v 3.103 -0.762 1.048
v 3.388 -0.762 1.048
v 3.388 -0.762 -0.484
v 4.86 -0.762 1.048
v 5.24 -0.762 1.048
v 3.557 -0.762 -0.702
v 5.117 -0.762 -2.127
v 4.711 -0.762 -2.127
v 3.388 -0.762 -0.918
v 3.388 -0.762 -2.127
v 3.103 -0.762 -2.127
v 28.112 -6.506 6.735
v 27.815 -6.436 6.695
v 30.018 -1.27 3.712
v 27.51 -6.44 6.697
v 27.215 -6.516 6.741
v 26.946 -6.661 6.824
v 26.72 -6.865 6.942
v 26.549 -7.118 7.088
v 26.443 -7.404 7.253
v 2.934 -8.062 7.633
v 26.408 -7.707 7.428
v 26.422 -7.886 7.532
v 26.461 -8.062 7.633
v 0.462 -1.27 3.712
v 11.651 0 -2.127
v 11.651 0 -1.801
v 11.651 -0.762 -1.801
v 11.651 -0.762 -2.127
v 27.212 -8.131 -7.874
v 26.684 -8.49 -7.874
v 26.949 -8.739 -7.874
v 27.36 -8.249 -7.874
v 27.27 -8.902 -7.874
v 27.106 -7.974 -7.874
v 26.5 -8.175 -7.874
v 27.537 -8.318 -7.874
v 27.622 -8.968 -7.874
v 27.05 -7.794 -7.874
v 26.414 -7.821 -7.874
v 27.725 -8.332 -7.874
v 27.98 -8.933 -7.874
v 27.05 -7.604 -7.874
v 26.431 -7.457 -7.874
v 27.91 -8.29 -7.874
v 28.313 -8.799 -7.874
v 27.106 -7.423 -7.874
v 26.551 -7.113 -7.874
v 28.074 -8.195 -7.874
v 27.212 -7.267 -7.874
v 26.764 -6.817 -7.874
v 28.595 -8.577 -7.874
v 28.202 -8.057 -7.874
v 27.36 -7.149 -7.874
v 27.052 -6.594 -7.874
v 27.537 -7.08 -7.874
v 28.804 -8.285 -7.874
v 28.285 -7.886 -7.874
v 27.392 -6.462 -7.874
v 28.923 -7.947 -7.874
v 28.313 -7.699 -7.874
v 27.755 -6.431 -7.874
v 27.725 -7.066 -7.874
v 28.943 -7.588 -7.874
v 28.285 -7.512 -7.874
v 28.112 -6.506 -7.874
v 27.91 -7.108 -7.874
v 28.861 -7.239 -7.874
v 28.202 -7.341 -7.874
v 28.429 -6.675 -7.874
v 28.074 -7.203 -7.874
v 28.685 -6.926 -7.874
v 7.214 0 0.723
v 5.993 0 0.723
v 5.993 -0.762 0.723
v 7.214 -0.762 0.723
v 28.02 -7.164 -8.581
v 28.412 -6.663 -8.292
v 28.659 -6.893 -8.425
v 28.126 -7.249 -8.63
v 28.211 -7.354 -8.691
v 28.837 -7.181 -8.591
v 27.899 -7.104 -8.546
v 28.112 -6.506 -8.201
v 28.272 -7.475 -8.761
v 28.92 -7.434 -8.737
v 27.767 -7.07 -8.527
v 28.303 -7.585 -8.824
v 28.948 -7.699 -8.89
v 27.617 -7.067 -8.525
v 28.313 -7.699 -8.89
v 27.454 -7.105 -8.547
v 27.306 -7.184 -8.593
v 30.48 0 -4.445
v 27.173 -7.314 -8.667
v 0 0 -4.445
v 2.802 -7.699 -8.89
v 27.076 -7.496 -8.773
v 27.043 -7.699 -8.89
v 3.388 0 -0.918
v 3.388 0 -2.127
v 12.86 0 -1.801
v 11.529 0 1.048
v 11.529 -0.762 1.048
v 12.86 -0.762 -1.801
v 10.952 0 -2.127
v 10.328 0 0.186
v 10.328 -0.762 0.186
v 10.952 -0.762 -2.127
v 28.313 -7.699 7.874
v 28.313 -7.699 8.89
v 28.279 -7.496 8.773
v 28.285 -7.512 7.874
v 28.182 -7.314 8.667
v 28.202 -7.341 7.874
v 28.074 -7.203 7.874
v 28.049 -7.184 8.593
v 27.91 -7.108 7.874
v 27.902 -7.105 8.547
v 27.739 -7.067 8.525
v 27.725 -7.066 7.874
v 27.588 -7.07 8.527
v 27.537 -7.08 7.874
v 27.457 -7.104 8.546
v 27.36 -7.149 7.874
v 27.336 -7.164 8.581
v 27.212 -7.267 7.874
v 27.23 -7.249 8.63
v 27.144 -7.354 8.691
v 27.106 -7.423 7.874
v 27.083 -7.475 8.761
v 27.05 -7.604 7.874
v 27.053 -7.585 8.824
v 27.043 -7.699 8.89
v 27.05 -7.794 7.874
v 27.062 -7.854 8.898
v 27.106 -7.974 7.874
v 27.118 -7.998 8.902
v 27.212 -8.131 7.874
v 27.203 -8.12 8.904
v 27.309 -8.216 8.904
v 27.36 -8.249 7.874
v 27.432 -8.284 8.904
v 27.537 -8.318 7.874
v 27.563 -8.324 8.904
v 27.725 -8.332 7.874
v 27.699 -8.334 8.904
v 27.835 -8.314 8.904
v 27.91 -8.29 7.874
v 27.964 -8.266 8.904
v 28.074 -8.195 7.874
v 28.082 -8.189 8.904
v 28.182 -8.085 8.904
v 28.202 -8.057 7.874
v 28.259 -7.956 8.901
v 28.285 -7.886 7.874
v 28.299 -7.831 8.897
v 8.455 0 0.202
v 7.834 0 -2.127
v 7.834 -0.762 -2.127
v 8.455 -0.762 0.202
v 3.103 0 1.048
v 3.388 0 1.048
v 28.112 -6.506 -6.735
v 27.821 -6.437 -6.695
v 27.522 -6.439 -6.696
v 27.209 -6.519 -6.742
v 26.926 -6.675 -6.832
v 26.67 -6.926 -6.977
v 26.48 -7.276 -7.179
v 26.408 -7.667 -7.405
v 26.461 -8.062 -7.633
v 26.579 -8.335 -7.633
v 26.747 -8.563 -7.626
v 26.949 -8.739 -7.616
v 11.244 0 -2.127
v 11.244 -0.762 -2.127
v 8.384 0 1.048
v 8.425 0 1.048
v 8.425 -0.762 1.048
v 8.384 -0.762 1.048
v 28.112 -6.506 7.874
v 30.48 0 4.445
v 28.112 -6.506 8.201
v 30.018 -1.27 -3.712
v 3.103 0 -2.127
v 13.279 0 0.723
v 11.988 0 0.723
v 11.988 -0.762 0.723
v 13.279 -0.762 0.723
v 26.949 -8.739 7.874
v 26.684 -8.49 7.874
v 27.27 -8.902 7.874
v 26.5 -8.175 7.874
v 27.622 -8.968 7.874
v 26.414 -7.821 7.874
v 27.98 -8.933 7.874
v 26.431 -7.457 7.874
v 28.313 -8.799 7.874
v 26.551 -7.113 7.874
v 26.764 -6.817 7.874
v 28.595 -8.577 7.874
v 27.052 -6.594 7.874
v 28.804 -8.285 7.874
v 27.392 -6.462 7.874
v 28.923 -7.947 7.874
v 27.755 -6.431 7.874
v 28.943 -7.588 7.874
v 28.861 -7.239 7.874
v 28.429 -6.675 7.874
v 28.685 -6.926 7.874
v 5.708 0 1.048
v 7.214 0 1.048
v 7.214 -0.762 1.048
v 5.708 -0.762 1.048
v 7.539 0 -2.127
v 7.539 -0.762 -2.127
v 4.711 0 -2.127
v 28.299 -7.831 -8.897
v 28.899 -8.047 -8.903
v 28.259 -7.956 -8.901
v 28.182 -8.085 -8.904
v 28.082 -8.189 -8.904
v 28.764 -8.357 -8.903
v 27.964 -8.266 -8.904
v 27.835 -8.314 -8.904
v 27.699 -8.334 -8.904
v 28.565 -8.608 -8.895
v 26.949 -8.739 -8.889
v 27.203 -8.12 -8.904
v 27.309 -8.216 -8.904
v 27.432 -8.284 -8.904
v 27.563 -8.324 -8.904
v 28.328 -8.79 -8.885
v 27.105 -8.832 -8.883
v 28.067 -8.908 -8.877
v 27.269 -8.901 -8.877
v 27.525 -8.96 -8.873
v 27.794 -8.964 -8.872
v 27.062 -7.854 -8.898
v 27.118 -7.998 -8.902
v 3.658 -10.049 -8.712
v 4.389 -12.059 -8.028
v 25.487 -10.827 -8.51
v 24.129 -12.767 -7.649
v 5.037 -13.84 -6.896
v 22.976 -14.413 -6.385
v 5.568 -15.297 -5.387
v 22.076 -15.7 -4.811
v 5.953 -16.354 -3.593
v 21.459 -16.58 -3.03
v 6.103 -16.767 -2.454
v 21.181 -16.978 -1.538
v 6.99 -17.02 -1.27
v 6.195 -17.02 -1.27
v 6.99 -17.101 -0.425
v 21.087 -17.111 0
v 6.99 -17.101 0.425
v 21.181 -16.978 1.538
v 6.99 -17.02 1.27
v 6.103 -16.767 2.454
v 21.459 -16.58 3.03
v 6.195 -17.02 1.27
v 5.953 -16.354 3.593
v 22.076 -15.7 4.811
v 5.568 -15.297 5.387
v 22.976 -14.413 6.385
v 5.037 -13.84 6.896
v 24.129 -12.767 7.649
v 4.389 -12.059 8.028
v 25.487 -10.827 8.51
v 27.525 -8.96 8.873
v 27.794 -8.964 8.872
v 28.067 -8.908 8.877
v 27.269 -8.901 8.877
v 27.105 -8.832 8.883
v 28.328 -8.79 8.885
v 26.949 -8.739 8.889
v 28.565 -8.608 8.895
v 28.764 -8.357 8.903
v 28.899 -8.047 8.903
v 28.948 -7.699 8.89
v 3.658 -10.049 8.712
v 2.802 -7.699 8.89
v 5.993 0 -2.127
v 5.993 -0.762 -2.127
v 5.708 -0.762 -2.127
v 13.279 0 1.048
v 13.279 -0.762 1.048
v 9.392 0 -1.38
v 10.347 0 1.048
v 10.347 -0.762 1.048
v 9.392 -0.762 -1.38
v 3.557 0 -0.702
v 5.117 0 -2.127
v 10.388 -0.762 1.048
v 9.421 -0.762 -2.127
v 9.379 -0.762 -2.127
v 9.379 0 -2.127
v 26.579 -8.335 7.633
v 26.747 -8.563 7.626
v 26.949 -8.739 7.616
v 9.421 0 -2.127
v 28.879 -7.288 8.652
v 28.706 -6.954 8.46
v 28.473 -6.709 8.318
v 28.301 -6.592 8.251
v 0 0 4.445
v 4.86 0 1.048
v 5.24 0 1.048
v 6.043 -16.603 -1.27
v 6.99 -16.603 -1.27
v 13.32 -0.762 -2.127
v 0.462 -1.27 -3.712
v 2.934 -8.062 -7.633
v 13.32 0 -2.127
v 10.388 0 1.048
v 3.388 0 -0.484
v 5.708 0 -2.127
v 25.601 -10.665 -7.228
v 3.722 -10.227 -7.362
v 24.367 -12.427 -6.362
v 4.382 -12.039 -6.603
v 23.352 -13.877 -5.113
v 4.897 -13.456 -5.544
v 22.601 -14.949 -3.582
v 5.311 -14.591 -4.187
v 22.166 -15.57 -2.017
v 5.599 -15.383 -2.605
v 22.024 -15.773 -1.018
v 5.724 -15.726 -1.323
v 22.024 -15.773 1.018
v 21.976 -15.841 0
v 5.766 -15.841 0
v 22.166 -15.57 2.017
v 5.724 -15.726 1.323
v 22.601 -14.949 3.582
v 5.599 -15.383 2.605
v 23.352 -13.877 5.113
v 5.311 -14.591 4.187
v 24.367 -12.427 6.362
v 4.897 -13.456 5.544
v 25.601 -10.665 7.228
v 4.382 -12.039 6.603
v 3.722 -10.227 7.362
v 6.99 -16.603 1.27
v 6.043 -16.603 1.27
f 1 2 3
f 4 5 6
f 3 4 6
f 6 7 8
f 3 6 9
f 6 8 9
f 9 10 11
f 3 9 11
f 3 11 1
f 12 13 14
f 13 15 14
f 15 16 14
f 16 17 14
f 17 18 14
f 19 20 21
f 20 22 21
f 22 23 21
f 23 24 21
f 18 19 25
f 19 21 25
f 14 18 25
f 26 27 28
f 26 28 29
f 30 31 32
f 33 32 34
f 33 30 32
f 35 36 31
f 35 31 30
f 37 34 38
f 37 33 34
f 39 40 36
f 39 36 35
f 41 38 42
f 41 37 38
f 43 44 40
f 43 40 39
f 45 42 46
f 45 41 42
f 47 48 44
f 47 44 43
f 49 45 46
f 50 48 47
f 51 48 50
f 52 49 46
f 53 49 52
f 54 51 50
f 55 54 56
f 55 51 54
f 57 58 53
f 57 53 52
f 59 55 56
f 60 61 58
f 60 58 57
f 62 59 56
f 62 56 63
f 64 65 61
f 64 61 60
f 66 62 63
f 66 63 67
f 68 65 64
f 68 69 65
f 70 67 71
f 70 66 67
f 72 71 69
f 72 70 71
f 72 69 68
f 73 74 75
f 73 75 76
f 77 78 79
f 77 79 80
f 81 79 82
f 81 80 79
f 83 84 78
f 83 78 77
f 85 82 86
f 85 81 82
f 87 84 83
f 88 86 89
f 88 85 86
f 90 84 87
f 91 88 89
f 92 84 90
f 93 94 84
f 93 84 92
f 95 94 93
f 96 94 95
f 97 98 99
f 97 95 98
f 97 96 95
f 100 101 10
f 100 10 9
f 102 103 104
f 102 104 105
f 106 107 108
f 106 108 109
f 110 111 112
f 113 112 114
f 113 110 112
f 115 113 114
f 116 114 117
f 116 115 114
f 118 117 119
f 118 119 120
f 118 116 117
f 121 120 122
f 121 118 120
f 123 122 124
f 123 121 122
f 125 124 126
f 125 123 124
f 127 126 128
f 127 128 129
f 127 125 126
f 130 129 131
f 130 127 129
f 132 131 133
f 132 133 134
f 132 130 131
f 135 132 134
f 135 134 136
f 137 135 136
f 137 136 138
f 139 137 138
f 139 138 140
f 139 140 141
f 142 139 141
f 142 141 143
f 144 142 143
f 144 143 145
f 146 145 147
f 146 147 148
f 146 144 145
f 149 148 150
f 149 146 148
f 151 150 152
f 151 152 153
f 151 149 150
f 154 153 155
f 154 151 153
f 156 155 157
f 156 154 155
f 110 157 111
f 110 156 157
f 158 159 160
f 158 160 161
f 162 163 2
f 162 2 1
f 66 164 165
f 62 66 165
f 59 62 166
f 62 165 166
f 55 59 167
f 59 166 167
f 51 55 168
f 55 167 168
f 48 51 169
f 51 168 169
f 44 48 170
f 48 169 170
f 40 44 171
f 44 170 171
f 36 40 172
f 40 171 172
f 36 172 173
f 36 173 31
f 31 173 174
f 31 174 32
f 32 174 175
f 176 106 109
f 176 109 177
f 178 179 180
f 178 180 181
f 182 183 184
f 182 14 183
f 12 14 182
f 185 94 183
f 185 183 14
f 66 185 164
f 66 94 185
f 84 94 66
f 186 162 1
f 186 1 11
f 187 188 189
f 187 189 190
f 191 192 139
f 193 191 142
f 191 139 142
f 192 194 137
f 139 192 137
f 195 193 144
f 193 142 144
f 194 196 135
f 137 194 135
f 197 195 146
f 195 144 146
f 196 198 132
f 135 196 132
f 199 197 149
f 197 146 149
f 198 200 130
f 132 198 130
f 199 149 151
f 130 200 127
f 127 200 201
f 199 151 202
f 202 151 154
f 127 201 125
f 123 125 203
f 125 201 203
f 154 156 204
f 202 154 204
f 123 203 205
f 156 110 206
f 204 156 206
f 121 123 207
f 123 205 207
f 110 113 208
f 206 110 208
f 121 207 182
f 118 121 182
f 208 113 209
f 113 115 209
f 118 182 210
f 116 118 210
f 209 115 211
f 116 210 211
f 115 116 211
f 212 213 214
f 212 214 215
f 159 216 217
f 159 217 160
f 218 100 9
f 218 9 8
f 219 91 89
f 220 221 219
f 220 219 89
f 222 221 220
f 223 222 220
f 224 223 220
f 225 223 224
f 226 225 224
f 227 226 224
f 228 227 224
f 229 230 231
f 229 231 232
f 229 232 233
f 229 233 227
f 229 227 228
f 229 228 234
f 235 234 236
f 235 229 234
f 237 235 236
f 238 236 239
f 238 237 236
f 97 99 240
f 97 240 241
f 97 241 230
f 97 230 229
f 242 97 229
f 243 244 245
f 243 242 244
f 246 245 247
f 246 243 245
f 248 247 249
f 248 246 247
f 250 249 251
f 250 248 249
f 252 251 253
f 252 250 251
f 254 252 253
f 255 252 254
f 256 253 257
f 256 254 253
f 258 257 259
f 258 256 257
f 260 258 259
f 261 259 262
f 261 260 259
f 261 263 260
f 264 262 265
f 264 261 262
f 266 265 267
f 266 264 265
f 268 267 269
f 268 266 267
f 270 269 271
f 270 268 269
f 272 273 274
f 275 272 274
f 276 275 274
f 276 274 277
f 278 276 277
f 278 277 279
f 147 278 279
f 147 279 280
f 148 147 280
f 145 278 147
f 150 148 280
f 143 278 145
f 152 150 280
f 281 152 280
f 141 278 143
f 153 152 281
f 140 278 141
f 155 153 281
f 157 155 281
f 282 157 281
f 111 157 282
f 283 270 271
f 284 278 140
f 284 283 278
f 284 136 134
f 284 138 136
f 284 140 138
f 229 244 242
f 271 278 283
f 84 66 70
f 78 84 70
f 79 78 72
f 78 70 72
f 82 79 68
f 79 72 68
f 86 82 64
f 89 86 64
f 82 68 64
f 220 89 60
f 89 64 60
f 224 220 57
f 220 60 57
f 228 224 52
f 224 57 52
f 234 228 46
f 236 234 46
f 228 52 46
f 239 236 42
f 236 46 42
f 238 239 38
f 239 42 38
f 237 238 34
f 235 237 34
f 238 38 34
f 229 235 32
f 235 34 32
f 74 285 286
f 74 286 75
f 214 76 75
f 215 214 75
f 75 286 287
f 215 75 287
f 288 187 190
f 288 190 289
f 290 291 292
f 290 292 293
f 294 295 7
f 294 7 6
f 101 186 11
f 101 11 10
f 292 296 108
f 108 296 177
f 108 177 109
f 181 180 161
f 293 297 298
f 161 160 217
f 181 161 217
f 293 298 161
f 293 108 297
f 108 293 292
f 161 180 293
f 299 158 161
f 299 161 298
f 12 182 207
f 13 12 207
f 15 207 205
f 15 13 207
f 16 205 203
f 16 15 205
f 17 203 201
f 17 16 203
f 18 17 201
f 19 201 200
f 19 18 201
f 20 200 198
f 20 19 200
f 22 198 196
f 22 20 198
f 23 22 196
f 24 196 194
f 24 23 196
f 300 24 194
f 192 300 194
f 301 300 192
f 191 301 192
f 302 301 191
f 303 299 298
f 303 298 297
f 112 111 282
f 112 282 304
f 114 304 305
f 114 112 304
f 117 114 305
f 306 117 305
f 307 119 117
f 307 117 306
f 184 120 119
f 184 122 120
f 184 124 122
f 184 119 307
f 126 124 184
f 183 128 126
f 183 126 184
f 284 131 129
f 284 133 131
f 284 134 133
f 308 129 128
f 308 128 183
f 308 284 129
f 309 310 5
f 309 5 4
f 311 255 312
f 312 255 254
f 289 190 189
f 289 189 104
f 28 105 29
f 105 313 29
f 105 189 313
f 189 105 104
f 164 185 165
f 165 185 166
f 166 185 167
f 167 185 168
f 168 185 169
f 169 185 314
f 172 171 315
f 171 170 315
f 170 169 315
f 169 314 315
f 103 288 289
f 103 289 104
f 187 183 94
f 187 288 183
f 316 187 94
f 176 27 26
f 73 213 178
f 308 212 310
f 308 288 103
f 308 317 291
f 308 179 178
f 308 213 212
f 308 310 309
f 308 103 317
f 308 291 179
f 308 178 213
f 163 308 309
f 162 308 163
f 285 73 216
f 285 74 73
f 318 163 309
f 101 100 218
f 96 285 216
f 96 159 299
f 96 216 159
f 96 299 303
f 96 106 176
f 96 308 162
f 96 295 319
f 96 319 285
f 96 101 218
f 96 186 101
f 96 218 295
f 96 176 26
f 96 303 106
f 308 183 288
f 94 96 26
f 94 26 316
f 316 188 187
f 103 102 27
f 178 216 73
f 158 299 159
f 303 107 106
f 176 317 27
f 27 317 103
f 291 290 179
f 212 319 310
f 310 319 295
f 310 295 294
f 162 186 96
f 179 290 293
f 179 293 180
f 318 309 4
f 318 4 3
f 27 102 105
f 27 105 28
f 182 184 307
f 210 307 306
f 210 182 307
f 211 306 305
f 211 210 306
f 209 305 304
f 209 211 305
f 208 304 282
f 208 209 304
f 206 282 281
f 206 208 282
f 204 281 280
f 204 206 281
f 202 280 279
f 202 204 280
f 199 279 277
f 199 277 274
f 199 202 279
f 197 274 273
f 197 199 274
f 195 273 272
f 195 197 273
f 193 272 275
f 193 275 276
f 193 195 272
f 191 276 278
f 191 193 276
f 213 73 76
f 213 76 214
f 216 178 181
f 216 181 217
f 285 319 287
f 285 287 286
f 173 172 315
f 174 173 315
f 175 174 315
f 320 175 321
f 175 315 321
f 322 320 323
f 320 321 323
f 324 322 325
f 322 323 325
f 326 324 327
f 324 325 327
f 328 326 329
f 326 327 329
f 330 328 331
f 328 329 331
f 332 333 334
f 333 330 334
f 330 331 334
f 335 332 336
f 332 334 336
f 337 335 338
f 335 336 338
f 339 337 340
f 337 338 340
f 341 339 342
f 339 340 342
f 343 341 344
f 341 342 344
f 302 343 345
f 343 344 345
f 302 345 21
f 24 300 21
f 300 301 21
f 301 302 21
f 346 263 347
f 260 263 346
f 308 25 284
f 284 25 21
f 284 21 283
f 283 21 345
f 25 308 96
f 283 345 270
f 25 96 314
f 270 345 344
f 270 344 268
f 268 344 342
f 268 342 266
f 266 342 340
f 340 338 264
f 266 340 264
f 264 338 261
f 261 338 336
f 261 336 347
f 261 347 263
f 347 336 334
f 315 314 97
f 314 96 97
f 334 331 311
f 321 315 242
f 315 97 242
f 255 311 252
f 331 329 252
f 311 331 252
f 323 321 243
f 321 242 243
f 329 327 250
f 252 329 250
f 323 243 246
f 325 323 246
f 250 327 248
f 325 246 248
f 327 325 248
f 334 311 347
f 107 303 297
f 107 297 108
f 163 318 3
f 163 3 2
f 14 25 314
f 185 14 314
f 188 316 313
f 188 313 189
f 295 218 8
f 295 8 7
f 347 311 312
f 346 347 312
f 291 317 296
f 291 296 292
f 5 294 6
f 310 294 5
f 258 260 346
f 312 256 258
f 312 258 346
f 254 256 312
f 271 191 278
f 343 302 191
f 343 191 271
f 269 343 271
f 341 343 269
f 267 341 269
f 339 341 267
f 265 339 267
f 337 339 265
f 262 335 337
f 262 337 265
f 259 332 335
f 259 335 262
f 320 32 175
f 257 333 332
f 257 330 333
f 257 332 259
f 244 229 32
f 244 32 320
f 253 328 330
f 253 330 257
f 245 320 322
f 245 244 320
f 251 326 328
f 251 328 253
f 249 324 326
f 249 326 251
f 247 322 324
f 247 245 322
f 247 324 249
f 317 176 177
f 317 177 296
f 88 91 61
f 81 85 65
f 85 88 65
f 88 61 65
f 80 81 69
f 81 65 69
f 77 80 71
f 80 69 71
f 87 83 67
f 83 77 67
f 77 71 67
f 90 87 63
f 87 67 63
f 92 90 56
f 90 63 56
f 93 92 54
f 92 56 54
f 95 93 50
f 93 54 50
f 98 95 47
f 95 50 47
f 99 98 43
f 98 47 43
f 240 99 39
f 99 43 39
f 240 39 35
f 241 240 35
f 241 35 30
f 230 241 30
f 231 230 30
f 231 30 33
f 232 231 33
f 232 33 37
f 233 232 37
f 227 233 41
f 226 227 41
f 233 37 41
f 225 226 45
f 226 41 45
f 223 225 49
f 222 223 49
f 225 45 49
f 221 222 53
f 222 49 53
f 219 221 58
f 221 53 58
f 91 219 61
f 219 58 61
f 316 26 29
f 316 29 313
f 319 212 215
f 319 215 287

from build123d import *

# Parameters (mm, degrees)
BOSS_EXTRUDE1_DEPTH     = 30.48
SHELL1_T                = -1.27
SKETCH2_R               = 0.635
CUT_EXTRUDE1_DEPTH      = 9.904502457
CUT_EXTRUDE1_DEPTH_BACK = 9.904502457
SKETCH4_R               = 1.27
CUT_EXTRUDE3_DEPTH      = 7.874
CUT_EXTRUDE3_DEPTH_BACK = 7.874
SKETCH5_W               = 1.524
SKETCH5_H               = 2.54
CUT_EXTRUDE5_DEPTH      = 0.508
CUT_EXTRUDE2_DEPTH      = 0.762


with BuildPart() as part:
    # Sketch1 → Boss-Extrude1 (new body)
    with BuildSketch(Plane(origin=(0, 0, 0), x_dir=(0, 0, -1), z_dir=(1, 0, 0))):
        with BuildLine():
            Line((-4.445, 0), (4.445, 0))
            Line((4.445, 0), (8.89, -7.69896584))
            ThreePointArc((8.89, -7.69896584), (0, -17.111468296), (-8.89, -7.69896584))
            Line((-8.89, -7.69896584), (-4.445, 0))
        make_face()
    extrude(amount=BOSS_EXTRUDE1_DEPTH)

    # Shell1
    shell1_openings = [part.faces().sort_by_distance(p)[0] for p in [
        (30.48, -6.202608534, 0),
        (0, -6.202608534, 0),
    ]]
    offset(amount=SHELL1_T, openings=shell1_openings, kind=Kind.INTERSECTION)

    # Sketch2 → Cut-Extrude1 (cut, two sides)
    with BuildSketch(Plane.XY) as cut_extrude1_sk:
        with Locations((27.6778056, -7.69896584)):
            Circle(SKETCH2_R)
        with BuildLine():
            Line((30.48, 0), (28.112171182, -6.505556211))
            ThreePointArc((28.112171182, -6.505556211), (28.804309358, -8.285386578), (26.949363526, -8.739288936))
            Line((26.949363526, -8.739288936), (21.087100426, -17.111468296))
            Line((21.087100426, -17.111468296), (30.48, -17.111468296))
            Line((30.48, -17.111468296), (30.48, 0))
        make_face()
        Polygon((0, 0), (6.228065124, -17.111468296), (0, -17.111468296), align=None)
    extrude(amount=CUT_EXTRUDE1_DEPTH, mode=Mode.SUBTRACT)
    extrude(cut_extrude1_sk.sketch, amount=-CUT_EXTRUDE1_DEPTH_BACK, mode=Mode.SUBTRACT)

    # Sketch4 → Cut-Extrude3 (cut, two sides)
    with BuildSketch(Plane.XY) as cut_extrude3_sk:
        with Locations((27.6778056, -7.69896584)):
            Circle(SKETCH4_R)
    extrude(amount=CUT_EXTRUDE3_DEPTH, mode=Mode.SUBTRACT)
    extrude(cut_extrude3_sk.sketch, amount=-CUT_EXTRUDE3_DEPTH_BACK, mode=Mode.SUBTRACT)

    # Sketch5 → Cut-Extrude5 (cut)
    with BuildSketch(Plane(origin=(0, -17.111468296, 0), x_dir=(1, 0, 0), z_dir=(0, 1, 0))):
        with Locations((6.228065124, 0)):
            Rectangle(SKETCH5_W, SKETCH5_H)
    extrude(amount=CUT_EXTRUDE5_DEPTH, mode=Mode.SUBTRACT)

    # Sketch3 → Cut-Extrude2 (cut)
    with BuildSketch(Plane(origin=(0, 0, 0), x_dir=(1, 0, 0), z_dir=(0, 1, 0))):
        Polygon((3.102574475, 2.126725666), (3.387510372, 2.126725666), (3.387510372, 0.917656155), (4.711063057, 2.126725666), (5.117478321, 2.126725666), (3.557327079, 0.702046179), (5.239593706, -1.048274334), (4.859891182, -1.048274334), (3.387510372, 0.483892132), (3.387510372, -1.048274334), (3.102574475, -1.048274334), align=None)
        Polygon((5.70770268, 2.126725666), (5.992638577, 2.126725666), (5.992638577, -0.722633308), (7.213792424, -0.722633308), (7.213792424, -1.048274334), (5.70770268, -1.048274334), align=None)
        Polygon((7.539433449, 2.126725666), (7.833909611, 2.126725666), (8.455298834, -0.201734871), (9.379432448, 2.126725666), (9.420773594, 2.126725666), (10.327734731, -0.18583443), (10.952304042, 2.126725666), (11.243600116, 2.126725666), (10.387520388, -1.048274334), (10.34681526, -1.048274334), (9.391516783, 1.380040971), (8.424769988, -1.048274334), (8.38406486, -1.048274334), align=None)
        Polygon((11.650651398, 1.80108464), (11.650651398, 2.126725666), (13.319561654, 2.126725666), (11.987740741, -0.722633308), (13.278856526, -0.722633308), (13.278856526, -1.048274334), (11.528536013, -1.048274334), (12.860356927, 1.80108464), align=None)
    extrude(amount=-CUT_EXTRUDE2_DEPTH, mode=Mode.SUBTRACT)


solid = part.part
